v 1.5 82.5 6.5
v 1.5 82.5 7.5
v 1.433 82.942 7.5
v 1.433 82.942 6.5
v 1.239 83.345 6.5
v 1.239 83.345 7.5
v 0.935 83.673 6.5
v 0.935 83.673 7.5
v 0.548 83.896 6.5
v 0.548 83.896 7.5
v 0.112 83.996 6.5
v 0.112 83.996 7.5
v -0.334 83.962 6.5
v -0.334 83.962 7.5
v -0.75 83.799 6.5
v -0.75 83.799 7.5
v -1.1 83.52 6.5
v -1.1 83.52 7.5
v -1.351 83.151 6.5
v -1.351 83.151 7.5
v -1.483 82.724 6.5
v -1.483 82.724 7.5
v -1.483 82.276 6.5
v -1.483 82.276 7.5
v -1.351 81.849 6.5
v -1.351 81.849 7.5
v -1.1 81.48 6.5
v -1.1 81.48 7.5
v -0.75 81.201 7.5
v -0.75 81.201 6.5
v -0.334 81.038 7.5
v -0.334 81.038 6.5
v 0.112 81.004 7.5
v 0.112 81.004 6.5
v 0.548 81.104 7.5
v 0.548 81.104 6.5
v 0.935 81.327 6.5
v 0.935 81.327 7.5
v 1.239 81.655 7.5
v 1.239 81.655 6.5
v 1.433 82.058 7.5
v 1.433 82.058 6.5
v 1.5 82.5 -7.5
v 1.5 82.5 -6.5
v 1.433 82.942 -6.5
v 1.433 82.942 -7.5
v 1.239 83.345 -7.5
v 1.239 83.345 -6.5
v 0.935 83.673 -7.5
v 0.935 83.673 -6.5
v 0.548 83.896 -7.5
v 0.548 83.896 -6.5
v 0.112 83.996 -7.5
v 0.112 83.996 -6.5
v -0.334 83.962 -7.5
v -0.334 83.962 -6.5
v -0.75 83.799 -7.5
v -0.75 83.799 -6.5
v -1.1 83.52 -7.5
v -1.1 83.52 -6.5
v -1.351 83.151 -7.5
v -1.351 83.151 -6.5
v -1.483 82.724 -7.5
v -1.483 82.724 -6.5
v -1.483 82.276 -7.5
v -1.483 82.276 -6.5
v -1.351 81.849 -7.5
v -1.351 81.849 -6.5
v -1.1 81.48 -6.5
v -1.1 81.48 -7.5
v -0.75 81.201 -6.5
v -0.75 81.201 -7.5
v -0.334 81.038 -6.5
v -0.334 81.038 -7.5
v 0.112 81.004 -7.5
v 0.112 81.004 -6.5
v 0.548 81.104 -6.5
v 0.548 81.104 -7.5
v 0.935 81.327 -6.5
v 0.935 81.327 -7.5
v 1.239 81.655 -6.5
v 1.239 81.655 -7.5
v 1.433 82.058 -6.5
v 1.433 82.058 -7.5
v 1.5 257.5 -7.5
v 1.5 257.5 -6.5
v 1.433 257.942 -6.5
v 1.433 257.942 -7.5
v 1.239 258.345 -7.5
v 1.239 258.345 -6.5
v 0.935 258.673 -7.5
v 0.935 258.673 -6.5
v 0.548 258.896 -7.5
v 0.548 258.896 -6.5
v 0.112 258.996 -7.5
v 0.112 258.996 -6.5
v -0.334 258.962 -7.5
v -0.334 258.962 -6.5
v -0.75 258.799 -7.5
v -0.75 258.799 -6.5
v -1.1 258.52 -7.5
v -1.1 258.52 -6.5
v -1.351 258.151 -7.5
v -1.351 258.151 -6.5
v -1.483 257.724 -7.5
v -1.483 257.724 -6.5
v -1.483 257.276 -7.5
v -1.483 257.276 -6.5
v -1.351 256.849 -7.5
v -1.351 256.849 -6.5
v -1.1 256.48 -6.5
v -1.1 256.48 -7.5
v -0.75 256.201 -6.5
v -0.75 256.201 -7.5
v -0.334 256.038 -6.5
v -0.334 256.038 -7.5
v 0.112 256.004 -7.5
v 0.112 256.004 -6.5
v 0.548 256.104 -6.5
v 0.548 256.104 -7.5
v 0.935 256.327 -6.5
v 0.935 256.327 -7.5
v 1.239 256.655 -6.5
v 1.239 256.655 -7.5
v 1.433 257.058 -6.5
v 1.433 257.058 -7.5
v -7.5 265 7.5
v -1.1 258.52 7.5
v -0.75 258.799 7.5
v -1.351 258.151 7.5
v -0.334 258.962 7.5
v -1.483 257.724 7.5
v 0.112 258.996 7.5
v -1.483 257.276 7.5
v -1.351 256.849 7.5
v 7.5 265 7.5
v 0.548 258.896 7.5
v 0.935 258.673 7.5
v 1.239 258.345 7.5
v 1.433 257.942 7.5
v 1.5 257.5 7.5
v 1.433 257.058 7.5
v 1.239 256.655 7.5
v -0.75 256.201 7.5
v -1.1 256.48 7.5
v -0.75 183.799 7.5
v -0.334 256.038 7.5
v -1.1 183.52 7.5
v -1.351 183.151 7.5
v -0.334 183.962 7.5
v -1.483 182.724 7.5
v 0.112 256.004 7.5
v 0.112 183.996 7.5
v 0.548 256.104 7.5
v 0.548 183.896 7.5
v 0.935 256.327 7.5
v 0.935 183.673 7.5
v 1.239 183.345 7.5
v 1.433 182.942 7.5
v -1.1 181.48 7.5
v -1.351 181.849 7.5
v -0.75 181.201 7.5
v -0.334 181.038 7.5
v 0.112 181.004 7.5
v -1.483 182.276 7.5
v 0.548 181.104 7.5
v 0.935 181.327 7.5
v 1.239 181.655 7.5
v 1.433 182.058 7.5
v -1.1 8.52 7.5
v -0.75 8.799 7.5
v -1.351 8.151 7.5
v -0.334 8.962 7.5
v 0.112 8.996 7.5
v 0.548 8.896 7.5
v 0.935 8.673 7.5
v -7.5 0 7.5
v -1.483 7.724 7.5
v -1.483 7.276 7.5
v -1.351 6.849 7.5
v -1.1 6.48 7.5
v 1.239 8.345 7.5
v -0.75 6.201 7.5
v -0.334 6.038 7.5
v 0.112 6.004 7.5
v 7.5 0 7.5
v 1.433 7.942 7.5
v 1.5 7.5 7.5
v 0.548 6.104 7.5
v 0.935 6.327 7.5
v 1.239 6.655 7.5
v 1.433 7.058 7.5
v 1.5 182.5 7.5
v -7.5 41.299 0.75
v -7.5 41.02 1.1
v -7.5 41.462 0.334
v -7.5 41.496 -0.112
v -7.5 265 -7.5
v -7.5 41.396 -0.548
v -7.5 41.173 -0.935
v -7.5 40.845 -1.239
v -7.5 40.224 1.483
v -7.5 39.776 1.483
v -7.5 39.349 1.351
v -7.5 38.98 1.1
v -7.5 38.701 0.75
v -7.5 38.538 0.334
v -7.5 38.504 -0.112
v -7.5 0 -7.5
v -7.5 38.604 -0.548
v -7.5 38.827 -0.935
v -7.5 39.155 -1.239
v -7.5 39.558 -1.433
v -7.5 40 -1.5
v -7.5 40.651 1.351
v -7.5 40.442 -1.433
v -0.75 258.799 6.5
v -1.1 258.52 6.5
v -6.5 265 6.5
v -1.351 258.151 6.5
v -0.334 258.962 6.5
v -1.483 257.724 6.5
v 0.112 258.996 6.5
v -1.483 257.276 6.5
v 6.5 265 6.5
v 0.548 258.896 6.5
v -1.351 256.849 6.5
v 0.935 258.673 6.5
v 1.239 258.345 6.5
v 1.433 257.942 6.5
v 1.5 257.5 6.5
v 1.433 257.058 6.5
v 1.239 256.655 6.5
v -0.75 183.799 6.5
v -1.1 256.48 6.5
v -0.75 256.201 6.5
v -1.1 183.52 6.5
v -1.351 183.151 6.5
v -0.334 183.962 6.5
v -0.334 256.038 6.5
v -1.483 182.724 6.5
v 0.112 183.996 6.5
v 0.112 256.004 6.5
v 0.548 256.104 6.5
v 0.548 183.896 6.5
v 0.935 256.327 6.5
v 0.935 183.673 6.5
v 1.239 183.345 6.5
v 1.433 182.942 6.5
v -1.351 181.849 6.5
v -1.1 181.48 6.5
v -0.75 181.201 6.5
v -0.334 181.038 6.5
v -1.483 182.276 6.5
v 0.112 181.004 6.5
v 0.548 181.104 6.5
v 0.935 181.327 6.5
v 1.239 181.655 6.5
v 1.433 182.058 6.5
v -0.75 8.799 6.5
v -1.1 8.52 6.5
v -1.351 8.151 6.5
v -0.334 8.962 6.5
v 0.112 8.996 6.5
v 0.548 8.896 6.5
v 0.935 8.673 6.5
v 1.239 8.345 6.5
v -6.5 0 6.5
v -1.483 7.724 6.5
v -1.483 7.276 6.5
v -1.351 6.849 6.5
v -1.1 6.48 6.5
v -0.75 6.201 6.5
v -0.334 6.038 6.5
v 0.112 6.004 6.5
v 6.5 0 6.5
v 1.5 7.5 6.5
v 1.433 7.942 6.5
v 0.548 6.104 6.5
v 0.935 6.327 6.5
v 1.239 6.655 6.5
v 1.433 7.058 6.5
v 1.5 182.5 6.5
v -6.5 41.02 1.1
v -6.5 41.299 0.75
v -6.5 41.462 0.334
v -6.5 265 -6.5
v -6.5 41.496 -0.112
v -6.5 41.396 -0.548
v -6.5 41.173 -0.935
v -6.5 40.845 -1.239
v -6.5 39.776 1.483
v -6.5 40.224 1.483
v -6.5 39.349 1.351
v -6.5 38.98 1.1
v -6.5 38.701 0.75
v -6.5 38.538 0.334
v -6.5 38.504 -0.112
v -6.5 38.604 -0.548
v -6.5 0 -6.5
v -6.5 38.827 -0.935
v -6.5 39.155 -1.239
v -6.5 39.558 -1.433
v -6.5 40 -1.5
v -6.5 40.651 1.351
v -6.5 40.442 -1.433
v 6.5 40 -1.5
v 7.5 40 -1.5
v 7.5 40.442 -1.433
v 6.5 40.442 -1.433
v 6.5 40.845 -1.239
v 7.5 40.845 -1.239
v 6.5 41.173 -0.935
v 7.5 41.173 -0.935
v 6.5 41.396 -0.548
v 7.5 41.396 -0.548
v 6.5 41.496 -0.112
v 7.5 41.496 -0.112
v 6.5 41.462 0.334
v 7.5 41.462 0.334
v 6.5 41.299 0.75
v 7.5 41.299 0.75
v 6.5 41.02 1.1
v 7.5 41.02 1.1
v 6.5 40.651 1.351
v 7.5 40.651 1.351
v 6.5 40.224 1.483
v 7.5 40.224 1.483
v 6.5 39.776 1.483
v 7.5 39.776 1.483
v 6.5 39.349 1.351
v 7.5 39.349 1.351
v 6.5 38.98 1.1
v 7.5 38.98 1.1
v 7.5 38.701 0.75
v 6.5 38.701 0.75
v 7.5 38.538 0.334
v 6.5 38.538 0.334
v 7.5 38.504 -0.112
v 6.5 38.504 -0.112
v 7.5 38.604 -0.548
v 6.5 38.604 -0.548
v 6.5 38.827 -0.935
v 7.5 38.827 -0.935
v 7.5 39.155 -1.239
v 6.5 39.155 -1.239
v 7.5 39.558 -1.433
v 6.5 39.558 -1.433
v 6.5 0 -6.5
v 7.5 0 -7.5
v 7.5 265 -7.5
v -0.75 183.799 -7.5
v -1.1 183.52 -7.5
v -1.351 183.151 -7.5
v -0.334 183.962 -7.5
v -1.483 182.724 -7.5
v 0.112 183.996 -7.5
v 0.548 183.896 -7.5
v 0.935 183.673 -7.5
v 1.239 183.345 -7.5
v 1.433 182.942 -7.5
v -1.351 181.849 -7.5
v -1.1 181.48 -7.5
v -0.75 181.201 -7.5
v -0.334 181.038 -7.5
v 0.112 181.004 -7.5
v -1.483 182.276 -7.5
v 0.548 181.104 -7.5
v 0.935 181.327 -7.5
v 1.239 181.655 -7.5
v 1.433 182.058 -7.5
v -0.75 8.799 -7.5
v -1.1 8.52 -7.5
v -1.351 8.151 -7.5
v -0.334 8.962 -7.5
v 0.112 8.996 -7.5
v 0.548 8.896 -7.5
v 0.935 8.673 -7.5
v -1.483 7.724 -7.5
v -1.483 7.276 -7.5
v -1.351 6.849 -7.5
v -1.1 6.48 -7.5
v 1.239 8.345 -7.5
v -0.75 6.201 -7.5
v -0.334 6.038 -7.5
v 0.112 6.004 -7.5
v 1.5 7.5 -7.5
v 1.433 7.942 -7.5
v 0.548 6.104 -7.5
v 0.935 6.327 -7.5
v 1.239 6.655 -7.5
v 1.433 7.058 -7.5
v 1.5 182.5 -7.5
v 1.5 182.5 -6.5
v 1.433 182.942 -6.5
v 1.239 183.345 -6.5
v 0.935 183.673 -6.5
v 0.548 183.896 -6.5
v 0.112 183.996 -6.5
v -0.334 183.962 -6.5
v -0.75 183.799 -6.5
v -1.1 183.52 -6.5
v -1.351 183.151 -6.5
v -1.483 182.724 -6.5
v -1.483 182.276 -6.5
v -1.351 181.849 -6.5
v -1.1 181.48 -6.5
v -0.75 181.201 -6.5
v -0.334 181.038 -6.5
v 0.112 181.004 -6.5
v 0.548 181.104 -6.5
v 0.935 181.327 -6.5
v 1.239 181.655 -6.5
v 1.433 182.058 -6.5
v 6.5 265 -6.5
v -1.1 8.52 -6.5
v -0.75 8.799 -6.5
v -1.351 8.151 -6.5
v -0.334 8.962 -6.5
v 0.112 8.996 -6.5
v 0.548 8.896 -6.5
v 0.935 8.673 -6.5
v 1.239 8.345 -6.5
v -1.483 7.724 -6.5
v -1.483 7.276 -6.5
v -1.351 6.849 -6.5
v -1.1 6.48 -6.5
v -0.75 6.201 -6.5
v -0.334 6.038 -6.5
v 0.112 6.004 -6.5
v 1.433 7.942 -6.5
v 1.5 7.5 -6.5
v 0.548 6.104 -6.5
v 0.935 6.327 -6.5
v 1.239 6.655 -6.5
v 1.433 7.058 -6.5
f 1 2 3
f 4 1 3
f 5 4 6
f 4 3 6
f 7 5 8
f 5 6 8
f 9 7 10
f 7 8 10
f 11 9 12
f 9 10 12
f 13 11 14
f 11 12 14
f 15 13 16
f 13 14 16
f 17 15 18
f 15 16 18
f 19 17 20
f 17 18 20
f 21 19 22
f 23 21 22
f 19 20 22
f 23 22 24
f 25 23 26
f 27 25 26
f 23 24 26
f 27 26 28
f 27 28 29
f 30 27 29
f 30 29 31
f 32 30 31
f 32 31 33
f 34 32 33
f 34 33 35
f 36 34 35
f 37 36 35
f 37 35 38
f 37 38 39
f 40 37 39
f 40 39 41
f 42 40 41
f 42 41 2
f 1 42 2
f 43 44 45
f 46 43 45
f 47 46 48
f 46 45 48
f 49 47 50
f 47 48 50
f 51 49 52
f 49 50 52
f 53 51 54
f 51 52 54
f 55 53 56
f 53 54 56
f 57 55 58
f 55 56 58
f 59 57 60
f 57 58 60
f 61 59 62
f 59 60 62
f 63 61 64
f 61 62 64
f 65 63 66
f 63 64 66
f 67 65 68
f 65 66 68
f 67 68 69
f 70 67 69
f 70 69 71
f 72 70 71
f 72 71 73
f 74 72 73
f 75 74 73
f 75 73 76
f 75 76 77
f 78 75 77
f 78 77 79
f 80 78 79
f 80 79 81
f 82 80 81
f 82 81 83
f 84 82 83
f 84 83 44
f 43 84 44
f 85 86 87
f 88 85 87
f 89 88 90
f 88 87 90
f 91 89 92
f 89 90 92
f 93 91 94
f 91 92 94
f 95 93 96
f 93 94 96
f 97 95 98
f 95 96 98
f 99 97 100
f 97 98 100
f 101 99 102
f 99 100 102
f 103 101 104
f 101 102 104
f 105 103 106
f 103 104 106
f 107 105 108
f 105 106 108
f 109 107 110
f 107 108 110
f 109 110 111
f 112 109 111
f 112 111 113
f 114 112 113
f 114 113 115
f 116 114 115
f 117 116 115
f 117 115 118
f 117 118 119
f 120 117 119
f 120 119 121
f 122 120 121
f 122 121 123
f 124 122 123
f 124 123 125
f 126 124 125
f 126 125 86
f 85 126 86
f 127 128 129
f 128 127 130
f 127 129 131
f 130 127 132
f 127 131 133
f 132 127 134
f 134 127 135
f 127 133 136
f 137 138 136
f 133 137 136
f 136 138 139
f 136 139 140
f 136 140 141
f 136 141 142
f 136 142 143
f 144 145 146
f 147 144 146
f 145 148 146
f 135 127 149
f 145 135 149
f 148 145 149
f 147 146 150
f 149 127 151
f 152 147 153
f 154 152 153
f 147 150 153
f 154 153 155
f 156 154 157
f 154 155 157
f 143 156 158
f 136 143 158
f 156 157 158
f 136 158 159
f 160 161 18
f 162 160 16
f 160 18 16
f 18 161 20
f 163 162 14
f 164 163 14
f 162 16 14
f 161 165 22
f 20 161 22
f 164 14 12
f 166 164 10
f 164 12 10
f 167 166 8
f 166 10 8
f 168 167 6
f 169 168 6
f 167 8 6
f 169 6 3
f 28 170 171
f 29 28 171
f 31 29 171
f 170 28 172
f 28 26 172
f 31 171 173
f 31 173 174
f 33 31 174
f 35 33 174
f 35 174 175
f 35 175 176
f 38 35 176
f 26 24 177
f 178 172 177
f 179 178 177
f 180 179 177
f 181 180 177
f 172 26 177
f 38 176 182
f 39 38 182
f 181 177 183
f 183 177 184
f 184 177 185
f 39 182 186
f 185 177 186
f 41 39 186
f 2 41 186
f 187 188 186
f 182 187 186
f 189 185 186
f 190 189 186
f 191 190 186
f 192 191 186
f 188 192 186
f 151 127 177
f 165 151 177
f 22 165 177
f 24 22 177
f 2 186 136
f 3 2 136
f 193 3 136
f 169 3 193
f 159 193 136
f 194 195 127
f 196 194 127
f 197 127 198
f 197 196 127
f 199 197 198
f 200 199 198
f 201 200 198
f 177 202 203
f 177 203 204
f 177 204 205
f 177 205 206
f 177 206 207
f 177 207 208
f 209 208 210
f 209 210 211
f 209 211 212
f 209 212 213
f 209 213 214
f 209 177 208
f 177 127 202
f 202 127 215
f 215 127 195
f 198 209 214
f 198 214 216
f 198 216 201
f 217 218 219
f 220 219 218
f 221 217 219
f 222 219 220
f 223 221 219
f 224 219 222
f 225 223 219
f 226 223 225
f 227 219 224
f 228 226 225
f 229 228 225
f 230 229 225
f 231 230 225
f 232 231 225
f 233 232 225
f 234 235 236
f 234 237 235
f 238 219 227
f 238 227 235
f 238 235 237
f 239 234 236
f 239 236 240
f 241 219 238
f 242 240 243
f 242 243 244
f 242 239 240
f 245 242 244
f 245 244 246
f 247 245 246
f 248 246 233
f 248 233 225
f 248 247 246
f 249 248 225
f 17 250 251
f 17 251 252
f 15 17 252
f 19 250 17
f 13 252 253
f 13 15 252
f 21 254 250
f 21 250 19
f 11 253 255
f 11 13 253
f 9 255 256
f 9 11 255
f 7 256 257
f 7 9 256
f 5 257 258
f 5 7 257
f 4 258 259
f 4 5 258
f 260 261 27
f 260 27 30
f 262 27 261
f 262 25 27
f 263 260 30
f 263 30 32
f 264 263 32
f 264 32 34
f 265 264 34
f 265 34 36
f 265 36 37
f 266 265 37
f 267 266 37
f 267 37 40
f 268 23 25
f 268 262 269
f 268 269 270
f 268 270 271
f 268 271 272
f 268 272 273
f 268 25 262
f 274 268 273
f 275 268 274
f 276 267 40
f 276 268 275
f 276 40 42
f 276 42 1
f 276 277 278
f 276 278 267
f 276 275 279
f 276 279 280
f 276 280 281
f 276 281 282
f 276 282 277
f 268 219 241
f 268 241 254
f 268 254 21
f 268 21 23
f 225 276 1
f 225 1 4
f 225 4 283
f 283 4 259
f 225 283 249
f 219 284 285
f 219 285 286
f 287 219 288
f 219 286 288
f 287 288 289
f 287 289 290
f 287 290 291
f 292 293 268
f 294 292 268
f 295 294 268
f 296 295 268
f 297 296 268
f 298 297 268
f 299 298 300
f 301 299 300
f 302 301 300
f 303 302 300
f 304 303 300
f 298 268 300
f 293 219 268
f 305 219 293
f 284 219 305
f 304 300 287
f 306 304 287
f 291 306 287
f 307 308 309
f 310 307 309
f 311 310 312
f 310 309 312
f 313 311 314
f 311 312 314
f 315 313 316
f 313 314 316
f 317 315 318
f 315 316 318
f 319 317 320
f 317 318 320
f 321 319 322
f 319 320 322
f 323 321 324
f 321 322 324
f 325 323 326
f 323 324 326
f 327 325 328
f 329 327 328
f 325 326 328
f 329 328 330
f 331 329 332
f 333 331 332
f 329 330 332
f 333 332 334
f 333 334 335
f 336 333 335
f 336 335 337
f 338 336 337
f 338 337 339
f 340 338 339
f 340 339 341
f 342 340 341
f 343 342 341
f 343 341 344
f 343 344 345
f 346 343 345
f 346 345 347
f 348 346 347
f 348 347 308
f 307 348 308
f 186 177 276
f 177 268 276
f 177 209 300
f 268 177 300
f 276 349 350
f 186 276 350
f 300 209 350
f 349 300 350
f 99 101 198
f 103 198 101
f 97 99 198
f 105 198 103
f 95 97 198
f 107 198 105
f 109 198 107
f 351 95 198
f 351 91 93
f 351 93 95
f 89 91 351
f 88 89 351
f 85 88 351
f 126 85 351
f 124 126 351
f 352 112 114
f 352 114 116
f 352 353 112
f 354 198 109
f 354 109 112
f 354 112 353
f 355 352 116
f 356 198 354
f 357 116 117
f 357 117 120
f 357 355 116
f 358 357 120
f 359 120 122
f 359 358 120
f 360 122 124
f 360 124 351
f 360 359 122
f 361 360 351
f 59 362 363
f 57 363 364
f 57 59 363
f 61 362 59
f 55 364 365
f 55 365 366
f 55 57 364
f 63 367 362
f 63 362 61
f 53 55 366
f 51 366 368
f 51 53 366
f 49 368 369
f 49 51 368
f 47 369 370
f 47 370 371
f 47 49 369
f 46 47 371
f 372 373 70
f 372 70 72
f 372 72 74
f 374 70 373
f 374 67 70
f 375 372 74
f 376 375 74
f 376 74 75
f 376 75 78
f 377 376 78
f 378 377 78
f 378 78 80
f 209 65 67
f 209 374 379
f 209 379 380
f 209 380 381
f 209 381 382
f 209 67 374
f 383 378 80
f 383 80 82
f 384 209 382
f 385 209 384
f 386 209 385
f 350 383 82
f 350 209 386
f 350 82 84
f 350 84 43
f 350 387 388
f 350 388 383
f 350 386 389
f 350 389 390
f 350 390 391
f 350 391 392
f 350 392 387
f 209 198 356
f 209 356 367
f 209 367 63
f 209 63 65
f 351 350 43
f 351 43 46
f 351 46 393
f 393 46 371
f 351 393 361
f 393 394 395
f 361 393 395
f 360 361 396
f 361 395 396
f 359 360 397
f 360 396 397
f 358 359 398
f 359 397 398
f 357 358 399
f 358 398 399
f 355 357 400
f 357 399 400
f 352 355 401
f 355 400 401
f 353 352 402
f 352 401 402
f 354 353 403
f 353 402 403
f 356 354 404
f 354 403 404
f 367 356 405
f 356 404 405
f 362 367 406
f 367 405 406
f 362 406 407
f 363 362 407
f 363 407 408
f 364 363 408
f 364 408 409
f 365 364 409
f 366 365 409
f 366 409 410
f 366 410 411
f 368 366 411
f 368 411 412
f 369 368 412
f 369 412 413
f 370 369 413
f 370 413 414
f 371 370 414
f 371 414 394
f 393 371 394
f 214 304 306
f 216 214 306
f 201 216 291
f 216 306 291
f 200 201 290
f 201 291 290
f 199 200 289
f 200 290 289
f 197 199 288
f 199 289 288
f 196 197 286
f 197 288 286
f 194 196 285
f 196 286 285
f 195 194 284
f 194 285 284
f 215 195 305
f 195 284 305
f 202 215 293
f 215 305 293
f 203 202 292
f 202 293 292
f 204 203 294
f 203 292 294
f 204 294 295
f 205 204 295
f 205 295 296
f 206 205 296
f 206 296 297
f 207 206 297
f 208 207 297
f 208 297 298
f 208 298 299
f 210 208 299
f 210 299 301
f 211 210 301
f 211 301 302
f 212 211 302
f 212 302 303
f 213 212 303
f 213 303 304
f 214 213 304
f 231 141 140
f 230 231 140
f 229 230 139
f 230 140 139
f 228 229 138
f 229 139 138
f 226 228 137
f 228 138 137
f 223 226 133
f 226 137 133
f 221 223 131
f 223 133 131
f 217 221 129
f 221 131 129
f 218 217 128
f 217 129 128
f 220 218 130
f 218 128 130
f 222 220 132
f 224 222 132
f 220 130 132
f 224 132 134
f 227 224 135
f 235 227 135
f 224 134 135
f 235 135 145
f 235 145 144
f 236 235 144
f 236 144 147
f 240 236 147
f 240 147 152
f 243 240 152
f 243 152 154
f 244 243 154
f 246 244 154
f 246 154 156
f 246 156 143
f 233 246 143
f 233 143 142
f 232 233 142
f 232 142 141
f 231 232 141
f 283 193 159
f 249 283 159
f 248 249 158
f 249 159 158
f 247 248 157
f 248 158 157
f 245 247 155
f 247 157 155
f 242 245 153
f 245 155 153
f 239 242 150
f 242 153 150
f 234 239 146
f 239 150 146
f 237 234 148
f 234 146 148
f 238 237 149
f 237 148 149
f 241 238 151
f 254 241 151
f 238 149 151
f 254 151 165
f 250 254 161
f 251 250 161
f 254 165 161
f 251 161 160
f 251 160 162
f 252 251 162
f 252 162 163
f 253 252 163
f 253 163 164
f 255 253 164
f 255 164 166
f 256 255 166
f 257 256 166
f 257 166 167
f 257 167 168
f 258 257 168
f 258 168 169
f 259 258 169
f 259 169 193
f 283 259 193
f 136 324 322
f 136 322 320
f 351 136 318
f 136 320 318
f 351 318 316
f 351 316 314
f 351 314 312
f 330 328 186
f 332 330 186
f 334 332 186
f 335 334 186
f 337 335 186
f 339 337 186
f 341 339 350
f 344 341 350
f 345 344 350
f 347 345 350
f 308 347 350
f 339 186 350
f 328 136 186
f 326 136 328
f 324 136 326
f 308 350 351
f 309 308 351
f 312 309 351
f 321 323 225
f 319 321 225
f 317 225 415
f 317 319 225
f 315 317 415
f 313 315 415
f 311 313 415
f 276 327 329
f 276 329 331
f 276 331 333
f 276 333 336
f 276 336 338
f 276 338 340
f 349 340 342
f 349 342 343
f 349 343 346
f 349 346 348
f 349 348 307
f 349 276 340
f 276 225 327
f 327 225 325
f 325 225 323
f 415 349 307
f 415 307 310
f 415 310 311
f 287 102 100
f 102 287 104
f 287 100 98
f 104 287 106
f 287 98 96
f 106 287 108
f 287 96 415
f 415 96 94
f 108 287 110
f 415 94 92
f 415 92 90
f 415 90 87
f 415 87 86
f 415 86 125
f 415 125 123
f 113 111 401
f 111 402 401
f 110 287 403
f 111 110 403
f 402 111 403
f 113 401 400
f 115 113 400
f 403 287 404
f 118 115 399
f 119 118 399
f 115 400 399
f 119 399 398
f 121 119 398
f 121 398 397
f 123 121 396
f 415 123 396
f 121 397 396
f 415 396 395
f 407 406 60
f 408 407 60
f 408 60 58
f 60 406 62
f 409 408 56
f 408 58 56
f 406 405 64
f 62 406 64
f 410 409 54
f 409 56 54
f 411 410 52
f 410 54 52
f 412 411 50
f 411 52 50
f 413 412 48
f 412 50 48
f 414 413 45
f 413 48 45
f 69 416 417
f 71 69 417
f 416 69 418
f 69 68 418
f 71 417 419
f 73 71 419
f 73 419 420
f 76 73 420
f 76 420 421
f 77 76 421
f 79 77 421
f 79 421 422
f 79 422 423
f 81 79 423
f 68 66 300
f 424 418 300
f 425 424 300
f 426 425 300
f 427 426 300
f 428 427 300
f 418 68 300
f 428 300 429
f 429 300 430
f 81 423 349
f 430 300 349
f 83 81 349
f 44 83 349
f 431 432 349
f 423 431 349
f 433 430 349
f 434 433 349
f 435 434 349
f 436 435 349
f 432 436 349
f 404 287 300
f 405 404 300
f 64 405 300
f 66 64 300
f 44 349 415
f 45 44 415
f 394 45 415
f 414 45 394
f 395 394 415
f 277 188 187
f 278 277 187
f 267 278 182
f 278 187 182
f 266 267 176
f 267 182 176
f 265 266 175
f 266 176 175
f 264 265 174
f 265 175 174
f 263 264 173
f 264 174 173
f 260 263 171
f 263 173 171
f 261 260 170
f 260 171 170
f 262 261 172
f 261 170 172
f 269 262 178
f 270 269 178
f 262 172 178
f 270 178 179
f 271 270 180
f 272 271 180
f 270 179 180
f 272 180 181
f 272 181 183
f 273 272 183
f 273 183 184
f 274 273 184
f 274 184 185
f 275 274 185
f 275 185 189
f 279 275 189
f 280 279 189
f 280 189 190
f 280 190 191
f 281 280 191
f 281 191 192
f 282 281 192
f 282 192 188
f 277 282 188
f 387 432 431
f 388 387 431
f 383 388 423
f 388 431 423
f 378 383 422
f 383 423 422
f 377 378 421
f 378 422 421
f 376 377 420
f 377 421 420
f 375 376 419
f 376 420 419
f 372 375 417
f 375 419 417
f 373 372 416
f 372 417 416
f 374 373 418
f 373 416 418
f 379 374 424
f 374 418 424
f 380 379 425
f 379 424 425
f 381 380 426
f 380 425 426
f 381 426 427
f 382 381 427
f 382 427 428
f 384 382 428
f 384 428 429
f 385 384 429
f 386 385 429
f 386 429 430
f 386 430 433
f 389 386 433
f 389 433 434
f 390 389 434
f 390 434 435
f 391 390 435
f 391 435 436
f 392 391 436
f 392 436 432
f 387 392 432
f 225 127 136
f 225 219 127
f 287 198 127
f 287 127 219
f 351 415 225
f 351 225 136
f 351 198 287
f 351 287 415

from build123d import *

# Parameters (mm, degrees)
SKETCH_1_W          = 15
SKETCH_1_H          = 15
SKETCH_1_W_2        = 13
SKETCH_1_H_2        = 13
EXTRUDE_1_DEPTH     = 265
SKETCH_2_R          = 1.5
CUT_EXTRUDE_1_DEPTH = 266.530130117
SKETCH_3_R          = 1.5
CUT_EXTRUDE_2_DEPTH = 266.530130117


with BuildPart() as part:
    # 草图1 → 凸台-拉伸1 (new body)
    with BuildSketch(Plane(origin=(0, 0, 0), x_dir=(1, 0, 0), z_dir=(0, 1, 0))):
        Rectangle(SKETCH_1_W, SKETCH_1_H)
        Rectangle(SKETCH_1_W_2, SKETCH_1_H_2, mode=Mode.SUBTRACT)
    extrude(amount=EXTRUDE_1_DEPTH)

    # 草图2 → 切除-拉伸1 (cut, through all)
    with BuildSketch(Plane.XY.offset(7.5)):
        with Locations((0, 7.5)):
            Circle(SKETCH_2_R)
        with Locations((0, 257.5)):
            Circle(SKETCH_2_R)
        with Locations((0, 182.5)):
            Circle(SKETCH_2_R)
        with Locations((0, 82.5)):
            Circle(SKETCH_2_R)
    extrude(amount=-CUT_EXTRUDE_1_DEPTH, mode=Mode.SUBTRACT)

    # 草图3 → 切除-拉伸2 (cut, through all)
    with BuildSketch(Plane(origin=(7.5, 0, 0), x_dir=(0, 0, -1), z_dir=(1, 0, 0))):
        with Locations((0, 40)):
            Circle(SKETCH_3_R)
    extrude(amount=-CUT_EXTRUDE_2_DEPTH, mode=Mode.SUBTRACT)


solid = part.part
